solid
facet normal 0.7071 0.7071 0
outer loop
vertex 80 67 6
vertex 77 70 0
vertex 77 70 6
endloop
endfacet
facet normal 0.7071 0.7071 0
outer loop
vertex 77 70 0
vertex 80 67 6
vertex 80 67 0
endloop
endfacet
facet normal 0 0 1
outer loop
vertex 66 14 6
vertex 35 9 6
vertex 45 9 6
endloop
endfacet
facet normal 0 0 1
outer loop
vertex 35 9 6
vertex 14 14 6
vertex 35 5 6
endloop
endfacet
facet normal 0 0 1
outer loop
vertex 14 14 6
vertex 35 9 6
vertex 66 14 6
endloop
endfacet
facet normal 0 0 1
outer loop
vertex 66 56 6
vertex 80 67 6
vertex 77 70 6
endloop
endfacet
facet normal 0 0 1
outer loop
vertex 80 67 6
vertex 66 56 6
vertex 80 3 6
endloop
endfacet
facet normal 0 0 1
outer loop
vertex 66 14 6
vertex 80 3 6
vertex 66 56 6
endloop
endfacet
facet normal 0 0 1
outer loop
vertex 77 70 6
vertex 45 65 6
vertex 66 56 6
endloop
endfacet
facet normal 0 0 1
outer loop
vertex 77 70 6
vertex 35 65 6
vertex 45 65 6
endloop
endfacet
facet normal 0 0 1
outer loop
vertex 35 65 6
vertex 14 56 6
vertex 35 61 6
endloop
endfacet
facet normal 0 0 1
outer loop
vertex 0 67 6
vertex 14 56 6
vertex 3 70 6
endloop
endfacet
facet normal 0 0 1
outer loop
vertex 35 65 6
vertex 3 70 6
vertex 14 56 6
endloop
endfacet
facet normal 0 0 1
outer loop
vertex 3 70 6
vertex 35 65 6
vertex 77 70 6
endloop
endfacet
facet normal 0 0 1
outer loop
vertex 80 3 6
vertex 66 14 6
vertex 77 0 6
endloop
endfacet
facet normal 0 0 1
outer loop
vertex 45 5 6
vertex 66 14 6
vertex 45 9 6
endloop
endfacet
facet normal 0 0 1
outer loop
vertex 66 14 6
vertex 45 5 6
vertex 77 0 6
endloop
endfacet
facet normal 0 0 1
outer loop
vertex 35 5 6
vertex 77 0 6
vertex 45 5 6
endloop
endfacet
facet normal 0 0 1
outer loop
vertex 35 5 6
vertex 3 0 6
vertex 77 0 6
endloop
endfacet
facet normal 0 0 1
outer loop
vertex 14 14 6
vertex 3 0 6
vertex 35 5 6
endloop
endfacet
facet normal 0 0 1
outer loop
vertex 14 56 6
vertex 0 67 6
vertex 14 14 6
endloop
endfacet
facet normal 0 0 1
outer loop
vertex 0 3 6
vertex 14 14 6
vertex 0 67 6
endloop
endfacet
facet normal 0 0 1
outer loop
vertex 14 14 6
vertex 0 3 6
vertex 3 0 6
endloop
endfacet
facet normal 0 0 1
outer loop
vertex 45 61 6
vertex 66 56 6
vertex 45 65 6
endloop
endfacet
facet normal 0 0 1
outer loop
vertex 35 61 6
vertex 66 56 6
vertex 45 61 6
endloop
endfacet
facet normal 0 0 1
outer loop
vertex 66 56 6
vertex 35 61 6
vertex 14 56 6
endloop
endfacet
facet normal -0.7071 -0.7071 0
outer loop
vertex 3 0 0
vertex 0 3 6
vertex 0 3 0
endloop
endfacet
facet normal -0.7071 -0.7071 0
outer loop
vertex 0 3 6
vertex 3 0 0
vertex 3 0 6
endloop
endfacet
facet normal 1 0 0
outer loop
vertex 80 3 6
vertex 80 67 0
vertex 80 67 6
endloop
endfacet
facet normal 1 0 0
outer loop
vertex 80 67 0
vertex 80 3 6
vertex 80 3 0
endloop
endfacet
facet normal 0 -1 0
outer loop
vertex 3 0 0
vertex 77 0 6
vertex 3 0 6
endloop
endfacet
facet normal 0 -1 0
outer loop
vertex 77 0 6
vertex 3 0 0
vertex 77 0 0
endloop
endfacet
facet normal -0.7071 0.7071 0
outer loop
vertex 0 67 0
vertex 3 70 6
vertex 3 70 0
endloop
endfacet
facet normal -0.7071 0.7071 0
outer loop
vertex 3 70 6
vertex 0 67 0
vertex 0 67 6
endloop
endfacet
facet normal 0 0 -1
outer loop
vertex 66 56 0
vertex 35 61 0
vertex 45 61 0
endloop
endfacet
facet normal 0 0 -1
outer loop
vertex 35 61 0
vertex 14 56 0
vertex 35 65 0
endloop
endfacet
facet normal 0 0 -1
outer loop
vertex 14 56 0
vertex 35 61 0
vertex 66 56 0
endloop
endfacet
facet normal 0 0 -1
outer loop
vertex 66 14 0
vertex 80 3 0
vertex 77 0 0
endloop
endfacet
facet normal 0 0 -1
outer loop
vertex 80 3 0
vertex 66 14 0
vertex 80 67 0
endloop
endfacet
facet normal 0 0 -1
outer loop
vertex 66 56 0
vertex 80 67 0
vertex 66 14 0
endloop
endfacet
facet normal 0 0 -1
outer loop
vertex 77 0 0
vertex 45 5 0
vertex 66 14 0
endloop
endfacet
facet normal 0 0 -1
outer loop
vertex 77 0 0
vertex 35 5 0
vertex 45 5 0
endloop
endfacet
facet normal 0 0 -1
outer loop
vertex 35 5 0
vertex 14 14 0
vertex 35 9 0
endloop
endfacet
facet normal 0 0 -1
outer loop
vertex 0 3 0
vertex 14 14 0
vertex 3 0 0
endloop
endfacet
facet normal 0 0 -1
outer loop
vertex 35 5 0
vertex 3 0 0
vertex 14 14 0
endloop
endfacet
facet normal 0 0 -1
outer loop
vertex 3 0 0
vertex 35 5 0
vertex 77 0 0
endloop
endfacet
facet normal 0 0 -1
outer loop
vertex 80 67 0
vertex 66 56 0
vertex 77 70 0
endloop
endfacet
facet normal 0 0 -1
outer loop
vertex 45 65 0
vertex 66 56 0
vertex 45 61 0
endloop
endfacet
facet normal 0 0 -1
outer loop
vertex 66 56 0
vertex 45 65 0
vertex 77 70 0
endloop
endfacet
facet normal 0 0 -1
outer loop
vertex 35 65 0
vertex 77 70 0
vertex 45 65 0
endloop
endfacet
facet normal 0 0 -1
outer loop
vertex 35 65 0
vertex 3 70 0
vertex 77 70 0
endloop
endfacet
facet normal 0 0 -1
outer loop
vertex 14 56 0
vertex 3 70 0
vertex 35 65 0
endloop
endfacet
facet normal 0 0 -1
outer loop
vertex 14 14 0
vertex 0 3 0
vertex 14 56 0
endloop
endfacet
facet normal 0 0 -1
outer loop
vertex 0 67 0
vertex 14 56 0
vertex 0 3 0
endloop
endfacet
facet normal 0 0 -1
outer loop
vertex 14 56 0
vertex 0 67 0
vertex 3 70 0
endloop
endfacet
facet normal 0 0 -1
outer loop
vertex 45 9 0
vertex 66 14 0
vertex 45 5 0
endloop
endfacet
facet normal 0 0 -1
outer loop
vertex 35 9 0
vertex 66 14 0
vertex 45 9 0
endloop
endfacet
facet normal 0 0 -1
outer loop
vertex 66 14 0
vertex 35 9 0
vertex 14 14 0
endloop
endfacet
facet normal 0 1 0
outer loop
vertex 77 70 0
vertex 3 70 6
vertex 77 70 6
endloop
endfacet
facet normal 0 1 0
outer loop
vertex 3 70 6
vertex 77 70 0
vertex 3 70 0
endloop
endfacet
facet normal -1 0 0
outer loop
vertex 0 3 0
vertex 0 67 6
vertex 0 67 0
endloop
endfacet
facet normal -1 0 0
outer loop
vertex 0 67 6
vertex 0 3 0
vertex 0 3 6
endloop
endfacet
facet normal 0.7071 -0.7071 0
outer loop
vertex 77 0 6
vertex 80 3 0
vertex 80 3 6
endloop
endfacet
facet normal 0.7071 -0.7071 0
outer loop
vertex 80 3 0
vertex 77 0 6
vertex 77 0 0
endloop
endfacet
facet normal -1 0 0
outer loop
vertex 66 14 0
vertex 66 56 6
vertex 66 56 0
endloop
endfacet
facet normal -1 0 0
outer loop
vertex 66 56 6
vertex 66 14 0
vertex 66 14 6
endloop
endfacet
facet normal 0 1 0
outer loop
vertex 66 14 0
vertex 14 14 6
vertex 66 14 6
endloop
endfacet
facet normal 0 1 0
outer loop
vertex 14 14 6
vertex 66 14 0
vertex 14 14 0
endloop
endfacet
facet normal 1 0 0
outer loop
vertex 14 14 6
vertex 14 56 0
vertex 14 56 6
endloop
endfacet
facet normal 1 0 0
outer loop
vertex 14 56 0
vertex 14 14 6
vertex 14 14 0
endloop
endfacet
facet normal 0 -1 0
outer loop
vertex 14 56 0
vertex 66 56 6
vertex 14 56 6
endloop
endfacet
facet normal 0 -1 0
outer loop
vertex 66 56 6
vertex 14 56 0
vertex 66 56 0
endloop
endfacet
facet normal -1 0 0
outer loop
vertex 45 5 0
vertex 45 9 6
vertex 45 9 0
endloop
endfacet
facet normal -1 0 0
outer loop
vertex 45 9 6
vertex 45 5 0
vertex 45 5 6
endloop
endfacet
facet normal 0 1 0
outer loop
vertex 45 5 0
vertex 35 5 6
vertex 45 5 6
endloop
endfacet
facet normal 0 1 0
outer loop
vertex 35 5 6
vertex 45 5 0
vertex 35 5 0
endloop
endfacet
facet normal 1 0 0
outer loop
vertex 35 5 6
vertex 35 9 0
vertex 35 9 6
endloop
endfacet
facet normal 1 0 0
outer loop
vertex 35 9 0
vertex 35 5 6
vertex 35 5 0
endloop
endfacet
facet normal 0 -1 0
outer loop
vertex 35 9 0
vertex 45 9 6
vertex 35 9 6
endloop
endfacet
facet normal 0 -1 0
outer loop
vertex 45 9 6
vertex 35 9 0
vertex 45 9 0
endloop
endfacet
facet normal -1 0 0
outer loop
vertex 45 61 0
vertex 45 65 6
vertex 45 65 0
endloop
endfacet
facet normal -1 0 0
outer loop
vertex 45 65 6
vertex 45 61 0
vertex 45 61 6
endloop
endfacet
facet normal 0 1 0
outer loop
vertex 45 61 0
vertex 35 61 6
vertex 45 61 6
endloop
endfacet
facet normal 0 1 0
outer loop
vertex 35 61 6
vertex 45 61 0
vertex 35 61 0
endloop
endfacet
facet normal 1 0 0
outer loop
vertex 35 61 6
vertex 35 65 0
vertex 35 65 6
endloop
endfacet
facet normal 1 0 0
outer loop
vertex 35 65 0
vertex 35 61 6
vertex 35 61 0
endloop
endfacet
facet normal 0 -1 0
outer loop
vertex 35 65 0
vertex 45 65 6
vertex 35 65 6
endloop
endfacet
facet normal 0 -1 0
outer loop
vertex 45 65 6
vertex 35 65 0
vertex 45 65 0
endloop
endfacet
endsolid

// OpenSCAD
$fn = 32;

// ----------------------------------------------------------------------
// Frame plate: 80 x 70 frame, 14 mm rails
// ----------------------------------------------------------------------

// --- parameters (mm) ---
plate_l = 80;             // plate length, X
plate_w = 70;             // plate width, Y
plate_t = 6;              // plate thickness, Z (extrusion height)
corner_c = 3;             // corner chamfer
frame_bar = 14;           // frame rail width
slot_l = 10;              // adjustment slot length
slot_w = 4;               // adjustment slot width

win_l = plate_l - 2 * frame_bar;  // window length
win_w = plate_w - 2 * frame_bar;  // window width

profile = [[3, 0], [77, 0], [80, 3], [80, 67], [77, 70], [3, 70], [0, 67], [0, 3]];  // primary outline, 8 points, counter clockwise
void_1 = [[14, 14], [66, 14], [66, 56], [14, 56]];  // the window, 4 points
void_2 = [[35, 5], [45, 5], [45, 9], [35, 9]];  // adjustment slot, 4 points
void_3 = [[35, 61], [45, 61], [45, 65], [35, 65]];  // adjustment slot, 4 points

// --- the one profile operation ---
difference() {
  linear_extrude(height = plate_t) polygon(points = profile);
  translate([0, 0, -1])
    linear_extrude(height = plate_t + 2) polygon(points = void_1);
  translate([0, 0, -1])
    linear_extrude(height = plate_t + 2) polygon(points = void_2);
  translate([0, 0, -1])
    linear_extrude(height = plate_t + 2) polygon(points = void_3);
}
